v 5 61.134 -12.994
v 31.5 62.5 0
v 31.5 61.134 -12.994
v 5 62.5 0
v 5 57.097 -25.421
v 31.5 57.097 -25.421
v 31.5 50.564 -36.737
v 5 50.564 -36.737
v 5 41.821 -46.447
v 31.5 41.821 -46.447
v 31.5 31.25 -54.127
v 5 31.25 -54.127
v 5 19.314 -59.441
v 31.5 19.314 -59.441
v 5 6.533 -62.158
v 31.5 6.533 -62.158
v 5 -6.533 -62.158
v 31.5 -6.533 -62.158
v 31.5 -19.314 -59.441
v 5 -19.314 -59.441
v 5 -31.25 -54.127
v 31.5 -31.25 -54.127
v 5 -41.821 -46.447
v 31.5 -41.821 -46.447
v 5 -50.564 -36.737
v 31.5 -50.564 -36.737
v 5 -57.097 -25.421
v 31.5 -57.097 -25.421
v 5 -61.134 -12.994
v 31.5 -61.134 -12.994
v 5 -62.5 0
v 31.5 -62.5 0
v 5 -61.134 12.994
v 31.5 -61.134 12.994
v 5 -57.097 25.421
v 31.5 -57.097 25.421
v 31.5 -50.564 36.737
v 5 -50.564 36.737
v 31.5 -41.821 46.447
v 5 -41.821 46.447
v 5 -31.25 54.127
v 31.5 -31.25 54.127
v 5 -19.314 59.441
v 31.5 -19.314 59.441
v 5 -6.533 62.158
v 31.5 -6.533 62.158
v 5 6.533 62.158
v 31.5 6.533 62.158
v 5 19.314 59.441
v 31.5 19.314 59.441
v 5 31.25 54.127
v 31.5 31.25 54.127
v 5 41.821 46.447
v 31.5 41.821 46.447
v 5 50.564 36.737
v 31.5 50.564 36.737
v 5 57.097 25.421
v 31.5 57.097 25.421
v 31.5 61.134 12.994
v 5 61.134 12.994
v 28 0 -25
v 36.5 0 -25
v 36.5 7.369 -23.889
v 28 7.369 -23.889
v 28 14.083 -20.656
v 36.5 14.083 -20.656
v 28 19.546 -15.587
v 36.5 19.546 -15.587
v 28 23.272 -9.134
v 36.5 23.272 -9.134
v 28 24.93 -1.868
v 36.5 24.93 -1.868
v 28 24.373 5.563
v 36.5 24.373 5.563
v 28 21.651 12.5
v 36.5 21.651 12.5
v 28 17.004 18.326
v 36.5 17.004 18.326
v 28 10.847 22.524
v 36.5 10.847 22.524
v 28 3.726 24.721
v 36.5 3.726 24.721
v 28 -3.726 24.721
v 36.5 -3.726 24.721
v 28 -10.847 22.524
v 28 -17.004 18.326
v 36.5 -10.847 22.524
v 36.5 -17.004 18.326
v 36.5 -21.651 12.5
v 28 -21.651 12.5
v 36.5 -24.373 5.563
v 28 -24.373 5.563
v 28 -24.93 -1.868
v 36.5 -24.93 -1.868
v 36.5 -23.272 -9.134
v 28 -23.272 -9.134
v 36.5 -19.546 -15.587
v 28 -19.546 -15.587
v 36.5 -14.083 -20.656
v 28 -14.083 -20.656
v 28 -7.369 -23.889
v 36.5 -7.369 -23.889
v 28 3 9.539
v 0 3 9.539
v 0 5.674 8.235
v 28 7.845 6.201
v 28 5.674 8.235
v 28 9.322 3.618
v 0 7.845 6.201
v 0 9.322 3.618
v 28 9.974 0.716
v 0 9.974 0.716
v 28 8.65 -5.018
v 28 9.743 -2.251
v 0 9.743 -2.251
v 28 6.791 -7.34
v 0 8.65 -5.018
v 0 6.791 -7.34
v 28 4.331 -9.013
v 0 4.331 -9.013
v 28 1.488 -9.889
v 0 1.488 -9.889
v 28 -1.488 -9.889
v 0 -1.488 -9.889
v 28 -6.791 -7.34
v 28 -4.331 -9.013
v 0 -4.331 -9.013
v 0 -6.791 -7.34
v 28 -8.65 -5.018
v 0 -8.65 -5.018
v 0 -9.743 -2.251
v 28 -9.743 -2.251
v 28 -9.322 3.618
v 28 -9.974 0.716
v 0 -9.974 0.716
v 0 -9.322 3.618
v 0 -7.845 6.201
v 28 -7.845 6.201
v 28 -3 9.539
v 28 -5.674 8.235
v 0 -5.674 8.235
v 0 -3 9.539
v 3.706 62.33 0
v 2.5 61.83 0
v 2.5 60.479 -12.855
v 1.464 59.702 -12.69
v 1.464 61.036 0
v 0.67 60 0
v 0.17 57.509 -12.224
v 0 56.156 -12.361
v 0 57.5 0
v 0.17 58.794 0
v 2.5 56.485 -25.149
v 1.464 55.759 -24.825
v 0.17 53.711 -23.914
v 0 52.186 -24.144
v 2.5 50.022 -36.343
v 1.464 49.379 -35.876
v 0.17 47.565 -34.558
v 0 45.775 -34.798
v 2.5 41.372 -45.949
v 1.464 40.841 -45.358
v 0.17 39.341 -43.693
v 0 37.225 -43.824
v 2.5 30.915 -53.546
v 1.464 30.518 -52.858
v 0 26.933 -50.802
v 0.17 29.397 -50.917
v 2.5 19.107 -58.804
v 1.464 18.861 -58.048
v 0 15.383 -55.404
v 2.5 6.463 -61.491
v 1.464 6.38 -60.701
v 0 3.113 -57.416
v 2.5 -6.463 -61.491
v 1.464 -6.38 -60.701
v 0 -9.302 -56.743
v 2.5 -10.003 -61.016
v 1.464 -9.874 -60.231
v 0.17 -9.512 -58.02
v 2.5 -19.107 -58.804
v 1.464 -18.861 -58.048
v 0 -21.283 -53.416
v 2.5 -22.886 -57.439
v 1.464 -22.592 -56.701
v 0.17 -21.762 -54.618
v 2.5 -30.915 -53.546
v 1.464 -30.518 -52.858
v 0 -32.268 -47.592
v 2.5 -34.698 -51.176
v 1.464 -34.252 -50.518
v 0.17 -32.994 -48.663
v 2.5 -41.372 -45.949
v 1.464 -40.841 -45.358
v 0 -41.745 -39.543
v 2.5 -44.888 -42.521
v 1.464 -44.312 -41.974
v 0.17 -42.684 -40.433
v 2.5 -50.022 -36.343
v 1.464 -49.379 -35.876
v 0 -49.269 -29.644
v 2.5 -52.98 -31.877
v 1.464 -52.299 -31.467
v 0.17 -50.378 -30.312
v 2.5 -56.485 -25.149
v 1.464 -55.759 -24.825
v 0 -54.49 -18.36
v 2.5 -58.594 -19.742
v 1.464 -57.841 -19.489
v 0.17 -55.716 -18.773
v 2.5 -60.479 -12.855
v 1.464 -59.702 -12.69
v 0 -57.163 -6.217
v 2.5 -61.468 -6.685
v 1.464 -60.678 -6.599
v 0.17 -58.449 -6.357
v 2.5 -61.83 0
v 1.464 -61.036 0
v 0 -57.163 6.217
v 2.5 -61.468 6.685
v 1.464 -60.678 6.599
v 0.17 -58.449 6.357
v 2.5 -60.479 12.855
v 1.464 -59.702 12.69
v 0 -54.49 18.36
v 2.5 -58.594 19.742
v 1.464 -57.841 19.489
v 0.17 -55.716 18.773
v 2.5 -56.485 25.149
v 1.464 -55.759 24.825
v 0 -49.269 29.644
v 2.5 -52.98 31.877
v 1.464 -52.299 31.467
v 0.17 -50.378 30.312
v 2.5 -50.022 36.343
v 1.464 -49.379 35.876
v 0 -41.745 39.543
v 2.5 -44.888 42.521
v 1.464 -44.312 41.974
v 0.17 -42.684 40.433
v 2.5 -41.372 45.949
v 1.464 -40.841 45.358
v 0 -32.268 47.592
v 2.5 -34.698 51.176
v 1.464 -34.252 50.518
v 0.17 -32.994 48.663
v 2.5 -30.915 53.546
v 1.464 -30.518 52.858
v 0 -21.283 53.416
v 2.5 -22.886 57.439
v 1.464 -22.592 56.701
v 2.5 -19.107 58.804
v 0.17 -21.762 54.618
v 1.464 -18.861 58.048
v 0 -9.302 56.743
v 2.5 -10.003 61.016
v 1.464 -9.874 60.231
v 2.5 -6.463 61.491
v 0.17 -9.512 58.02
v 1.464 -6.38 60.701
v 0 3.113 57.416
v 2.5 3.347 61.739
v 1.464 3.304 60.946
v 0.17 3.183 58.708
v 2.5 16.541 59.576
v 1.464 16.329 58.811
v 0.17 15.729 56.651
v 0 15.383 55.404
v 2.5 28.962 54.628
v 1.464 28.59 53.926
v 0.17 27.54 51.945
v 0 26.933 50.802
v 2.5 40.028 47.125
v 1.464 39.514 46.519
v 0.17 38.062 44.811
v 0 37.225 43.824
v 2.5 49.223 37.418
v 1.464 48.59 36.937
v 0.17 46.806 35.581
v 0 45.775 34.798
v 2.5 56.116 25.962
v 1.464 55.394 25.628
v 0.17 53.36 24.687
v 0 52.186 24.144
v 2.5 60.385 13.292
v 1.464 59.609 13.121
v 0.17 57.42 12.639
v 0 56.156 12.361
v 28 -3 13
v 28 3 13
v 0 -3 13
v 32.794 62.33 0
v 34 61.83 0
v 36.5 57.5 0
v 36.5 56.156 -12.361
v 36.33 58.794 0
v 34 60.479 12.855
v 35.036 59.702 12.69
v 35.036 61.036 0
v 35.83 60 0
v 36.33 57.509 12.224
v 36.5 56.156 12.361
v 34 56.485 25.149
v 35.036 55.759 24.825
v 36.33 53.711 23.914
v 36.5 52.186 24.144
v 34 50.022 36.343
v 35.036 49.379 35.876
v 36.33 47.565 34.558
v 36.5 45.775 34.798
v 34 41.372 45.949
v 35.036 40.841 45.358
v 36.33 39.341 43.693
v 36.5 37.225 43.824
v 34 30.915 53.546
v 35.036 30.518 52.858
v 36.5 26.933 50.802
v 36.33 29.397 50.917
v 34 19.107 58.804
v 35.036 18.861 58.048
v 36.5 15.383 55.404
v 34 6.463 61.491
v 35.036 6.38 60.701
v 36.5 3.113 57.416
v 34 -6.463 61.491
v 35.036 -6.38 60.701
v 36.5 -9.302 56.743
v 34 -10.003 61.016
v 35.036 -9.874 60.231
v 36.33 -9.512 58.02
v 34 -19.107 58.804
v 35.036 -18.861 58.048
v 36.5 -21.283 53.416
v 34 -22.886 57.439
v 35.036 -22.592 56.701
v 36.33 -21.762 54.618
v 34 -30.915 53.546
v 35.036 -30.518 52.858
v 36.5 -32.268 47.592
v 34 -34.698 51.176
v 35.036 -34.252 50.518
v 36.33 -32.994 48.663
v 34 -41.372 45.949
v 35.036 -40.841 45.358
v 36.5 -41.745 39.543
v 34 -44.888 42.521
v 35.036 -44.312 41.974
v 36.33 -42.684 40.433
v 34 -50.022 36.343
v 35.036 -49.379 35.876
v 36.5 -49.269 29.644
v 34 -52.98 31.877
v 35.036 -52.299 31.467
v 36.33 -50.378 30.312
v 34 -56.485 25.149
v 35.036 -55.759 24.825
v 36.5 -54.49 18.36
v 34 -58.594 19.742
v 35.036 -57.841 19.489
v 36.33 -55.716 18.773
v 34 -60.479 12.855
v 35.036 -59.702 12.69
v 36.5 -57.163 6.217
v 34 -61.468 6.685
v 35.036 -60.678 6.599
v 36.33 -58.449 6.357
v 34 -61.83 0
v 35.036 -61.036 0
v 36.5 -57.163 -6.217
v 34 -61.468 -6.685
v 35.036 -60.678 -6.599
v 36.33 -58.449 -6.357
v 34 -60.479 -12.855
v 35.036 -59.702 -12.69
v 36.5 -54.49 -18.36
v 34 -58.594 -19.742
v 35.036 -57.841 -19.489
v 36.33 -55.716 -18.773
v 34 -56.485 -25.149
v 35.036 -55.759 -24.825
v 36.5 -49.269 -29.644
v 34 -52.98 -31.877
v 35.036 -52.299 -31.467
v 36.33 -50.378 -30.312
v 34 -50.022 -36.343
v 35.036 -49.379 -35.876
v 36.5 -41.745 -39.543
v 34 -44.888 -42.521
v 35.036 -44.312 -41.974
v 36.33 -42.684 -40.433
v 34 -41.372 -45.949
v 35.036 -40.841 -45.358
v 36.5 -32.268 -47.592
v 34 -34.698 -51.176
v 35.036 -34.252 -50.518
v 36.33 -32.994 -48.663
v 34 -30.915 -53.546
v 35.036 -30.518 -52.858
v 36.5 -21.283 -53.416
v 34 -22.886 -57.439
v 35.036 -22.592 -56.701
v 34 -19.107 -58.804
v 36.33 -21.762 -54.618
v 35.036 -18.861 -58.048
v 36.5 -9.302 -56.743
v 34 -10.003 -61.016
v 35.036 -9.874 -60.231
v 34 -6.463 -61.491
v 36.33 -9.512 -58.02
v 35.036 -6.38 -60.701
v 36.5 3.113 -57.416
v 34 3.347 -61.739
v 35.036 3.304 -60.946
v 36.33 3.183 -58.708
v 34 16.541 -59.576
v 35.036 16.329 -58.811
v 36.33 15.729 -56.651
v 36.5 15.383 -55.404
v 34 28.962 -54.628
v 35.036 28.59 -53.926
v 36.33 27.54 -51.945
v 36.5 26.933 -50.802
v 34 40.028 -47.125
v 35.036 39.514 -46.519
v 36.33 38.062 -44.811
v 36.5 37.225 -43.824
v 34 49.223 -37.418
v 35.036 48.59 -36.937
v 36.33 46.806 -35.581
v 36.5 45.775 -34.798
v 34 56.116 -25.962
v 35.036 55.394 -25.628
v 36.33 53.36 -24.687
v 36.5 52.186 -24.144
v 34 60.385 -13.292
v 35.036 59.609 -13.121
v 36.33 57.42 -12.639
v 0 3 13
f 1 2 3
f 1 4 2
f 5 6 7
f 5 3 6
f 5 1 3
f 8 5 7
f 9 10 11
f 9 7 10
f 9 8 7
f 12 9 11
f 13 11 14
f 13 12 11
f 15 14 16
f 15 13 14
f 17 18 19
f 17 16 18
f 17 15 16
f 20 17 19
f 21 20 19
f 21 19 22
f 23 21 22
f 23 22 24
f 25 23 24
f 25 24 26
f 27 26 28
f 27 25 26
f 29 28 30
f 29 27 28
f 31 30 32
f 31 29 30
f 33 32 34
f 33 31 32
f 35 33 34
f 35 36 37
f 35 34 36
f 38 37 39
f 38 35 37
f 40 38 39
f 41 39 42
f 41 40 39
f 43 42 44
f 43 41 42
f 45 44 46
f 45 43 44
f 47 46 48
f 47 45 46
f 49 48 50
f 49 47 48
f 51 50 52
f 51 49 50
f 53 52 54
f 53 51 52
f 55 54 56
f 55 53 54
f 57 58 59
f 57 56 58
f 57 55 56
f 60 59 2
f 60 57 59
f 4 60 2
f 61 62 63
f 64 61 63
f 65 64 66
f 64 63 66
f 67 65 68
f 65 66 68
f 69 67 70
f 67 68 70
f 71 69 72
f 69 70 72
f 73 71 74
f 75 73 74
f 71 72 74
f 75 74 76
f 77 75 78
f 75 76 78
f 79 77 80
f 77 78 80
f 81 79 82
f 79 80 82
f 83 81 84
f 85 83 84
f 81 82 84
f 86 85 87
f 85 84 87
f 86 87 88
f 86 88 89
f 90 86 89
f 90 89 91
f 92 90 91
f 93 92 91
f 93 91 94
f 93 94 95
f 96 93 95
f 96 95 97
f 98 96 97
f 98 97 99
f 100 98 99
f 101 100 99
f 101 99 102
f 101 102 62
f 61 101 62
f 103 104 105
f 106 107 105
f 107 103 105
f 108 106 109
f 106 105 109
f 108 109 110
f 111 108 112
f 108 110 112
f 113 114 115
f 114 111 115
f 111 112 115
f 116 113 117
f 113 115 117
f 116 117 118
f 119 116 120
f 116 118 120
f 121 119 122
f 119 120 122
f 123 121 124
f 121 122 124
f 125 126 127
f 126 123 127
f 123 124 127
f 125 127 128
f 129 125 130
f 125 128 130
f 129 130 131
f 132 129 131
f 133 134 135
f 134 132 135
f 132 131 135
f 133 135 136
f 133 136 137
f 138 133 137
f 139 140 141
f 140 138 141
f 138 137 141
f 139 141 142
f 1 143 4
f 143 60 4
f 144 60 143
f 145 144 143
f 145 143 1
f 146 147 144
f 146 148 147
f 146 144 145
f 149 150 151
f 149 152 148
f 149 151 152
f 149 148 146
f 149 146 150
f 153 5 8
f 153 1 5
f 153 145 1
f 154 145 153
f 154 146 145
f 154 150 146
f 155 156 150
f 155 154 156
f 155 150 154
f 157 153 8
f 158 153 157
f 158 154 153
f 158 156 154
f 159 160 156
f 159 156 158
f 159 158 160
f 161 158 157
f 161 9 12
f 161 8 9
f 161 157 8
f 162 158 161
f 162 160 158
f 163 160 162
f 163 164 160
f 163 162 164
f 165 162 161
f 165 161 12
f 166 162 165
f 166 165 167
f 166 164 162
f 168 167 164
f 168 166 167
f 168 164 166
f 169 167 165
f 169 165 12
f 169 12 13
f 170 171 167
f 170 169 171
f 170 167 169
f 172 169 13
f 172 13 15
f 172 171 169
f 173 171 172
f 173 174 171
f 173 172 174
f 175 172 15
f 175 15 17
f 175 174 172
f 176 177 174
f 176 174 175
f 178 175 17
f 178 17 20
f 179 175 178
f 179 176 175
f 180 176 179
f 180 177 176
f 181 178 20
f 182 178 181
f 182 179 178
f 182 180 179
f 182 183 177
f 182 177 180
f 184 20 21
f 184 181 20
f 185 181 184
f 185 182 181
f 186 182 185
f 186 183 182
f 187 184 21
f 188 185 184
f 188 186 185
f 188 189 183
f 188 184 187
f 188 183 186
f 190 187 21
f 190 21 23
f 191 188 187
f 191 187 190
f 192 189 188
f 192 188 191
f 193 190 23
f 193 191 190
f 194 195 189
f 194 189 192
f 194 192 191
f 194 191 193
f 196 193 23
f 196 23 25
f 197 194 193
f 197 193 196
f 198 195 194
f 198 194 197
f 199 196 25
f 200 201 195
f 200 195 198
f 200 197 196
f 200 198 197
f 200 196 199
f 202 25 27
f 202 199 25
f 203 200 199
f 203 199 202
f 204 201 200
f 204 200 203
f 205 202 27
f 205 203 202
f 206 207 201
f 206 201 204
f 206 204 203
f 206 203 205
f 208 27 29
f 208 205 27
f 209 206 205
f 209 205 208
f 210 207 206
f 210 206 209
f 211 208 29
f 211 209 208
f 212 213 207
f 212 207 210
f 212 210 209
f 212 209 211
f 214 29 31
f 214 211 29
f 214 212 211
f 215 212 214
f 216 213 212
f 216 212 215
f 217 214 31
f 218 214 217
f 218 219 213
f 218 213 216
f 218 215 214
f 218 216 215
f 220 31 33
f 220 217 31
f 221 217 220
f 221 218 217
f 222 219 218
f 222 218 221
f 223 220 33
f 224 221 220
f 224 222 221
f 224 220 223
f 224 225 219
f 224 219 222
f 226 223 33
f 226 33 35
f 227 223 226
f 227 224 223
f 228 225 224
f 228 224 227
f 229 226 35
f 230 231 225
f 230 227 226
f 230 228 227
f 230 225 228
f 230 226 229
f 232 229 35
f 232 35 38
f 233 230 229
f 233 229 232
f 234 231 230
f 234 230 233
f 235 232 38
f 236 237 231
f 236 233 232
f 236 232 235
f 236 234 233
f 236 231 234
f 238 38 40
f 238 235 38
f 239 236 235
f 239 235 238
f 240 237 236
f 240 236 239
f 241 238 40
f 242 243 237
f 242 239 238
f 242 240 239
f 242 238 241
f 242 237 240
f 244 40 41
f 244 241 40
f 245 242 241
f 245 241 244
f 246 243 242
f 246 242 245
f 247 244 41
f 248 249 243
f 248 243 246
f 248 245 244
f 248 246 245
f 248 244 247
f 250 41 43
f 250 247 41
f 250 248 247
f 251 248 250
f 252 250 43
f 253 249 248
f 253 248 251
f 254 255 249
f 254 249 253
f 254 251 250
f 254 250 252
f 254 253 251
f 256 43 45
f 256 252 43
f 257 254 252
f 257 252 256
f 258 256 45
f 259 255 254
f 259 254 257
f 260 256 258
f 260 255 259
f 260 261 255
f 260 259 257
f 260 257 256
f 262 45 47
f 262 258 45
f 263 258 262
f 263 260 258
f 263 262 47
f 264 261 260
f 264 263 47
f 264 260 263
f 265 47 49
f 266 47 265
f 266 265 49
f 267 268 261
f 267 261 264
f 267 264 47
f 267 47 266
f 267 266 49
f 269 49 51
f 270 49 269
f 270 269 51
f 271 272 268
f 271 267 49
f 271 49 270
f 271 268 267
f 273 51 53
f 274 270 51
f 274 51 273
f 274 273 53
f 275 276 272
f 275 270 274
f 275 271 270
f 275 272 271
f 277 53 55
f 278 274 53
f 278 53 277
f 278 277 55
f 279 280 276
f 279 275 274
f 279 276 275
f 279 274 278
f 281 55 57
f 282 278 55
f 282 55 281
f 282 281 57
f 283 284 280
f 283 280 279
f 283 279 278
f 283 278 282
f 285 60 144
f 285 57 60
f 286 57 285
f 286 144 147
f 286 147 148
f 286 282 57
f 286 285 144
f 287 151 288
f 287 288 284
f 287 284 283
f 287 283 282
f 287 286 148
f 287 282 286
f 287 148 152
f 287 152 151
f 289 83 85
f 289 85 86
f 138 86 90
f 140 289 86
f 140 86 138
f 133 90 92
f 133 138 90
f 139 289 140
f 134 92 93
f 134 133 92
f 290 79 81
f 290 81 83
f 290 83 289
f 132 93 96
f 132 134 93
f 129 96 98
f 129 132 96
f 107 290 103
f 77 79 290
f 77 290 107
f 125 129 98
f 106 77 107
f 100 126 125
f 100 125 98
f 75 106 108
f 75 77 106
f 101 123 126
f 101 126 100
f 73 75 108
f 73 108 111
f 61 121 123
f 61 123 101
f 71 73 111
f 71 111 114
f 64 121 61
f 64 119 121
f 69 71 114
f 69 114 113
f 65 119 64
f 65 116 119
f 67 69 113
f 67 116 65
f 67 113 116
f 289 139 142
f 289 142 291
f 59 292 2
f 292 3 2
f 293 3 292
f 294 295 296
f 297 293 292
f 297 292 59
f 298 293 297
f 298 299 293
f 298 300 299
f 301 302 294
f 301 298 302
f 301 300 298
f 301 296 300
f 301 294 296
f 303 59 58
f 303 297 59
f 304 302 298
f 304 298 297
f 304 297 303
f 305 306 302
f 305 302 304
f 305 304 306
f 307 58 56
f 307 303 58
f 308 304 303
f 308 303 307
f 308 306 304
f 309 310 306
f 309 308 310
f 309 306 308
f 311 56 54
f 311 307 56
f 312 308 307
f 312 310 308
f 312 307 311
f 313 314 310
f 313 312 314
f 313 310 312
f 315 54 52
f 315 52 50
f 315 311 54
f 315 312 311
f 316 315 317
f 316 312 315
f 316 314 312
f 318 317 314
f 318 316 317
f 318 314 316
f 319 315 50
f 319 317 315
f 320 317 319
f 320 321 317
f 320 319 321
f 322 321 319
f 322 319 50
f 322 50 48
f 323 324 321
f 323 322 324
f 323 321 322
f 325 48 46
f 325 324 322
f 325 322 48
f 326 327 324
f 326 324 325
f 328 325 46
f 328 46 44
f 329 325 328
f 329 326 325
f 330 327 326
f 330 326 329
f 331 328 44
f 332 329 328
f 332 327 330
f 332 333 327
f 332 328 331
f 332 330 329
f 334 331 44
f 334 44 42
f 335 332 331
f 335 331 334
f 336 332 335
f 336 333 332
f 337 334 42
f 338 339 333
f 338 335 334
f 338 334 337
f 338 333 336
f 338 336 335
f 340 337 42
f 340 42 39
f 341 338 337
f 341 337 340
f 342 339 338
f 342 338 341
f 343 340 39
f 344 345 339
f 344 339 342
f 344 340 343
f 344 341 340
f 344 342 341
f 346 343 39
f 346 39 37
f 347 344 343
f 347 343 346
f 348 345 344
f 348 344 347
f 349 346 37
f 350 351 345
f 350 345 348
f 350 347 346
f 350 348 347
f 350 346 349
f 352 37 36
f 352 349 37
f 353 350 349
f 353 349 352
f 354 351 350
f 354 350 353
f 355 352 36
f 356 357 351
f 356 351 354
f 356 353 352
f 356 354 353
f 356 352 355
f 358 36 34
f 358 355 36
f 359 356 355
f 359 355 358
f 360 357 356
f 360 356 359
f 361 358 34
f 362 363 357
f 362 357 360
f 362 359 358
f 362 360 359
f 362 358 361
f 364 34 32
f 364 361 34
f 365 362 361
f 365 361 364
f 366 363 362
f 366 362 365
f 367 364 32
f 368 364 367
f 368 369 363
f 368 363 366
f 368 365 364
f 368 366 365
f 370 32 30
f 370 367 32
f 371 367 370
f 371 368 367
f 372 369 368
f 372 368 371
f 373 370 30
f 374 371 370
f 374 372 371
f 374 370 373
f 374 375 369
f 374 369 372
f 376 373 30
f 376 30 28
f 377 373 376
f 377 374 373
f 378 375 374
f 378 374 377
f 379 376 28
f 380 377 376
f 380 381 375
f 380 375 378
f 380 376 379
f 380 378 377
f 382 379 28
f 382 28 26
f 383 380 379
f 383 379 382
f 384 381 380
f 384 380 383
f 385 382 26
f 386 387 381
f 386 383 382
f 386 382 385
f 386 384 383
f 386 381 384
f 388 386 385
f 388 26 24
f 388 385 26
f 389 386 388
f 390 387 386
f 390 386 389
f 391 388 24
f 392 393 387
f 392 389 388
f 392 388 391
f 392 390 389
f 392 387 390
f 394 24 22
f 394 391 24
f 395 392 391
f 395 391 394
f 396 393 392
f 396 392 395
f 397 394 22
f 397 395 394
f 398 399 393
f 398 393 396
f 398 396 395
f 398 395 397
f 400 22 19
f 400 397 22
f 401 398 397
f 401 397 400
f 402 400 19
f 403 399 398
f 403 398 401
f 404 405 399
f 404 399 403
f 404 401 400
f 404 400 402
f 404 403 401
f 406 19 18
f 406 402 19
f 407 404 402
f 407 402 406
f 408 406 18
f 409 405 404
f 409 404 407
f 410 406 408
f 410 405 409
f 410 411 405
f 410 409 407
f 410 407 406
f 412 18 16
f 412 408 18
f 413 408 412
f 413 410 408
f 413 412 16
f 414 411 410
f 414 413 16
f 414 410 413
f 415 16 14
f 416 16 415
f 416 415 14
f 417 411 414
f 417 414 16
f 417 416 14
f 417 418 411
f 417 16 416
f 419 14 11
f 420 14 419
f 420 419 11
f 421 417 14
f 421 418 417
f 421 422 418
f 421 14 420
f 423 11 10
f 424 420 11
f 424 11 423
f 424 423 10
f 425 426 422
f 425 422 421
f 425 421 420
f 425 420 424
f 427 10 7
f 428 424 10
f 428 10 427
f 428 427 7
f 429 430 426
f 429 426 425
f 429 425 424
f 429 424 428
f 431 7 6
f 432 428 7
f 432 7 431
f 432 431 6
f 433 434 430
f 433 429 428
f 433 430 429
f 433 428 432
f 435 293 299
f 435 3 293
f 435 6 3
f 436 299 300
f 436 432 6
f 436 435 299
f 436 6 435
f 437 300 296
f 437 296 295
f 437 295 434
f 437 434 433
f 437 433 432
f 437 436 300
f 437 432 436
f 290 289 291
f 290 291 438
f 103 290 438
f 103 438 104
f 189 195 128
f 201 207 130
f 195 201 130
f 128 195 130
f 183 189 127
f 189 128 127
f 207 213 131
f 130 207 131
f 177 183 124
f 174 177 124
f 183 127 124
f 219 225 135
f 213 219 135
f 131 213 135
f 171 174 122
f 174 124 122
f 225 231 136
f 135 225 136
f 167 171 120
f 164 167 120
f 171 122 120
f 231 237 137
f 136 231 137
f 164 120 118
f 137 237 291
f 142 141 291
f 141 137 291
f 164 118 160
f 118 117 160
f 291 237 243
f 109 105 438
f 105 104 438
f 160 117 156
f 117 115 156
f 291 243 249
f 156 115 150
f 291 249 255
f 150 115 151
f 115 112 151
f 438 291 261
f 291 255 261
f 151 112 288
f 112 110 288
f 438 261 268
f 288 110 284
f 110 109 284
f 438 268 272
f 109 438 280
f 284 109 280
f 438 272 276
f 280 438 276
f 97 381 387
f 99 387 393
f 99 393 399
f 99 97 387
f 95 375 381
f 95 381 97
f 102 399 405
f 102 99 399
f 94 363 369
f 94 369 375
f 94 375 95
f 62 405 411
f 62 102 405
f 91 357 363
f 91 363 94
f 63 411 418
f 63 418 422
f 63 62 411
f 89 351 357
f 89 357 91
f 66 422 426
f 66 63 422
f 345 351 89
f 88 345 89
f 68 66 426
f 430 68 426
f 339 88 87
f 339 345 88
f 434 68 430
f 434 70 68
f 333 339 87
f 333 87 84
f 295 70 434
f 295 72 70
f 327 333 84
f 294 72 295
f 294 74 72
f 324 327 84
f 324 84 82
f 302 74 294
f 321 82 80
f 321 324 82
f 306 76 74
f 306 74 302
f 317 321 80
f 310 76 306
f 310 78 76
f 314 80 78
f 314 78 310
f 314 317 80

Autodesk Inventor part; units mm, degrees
ref_plane "YZ Plane" through (0, 0, 0) normal (1, 0, 0) x (0, 1, 0)
ref_plane "XZ Plane" through (0, 0, 0) normal (0, 1, 0) x (-1, 0, 0)
ref_plane "XY Plane" through (0, 0, 0) normal (0, 0, 1) x (1, 0, 0)
sketch "Sketch1" plane through (0, 0, 0) normal (1, 0, 0) x (0, 1, 0)
  circle A0 centre (0, 0) radius 62.5
  dimension "d0" = 125
extrude "Extrusion1" add sketch "Sketch1" along normal blind 36.5
fillet "Fillet1" radius 5 2 edges at (36.5, -62.5, 0) (0, -62.5, 0)
sketch "Sketch2" plane through (36.5, 0, 0) normal (1, 0, 0) x (0, 0, -1)
  circle A0 centre (0, 0) radius 62.5 projected
hole "Hole1" at (36.5, 0, 0) direction (-1, 0, 0) diameter 20 end through all
sketch "Sketch3" plane through (36.5, 0, 0) normal (1, 0, 0) x (0, 0, -1)
  circle A0 centre (0, 0) radius 25
  dimension "d11" = 50
extrude "Extrusion2" cut sketch "Sketch3" against normal blind 8.5
sketch "Sketch4" plane through (28, 0, 0) normal (1, 0, 0) x (0, 0, -1)
  line L0 (-7, -3) -> (-13, -3)
  line L1 (-13, -3) -> (-13, 3)
  line L2 (-13, 3) -> (-7, 3)
  line L3 (-7, 3) -> (-7, -3)
  circle A0 centre (0, 0) radius 10 projected
  line L4 (-7, -3) -> (-13, 3) construction
  line L5 (-13, -3) -> (-7, 3) construction
  point P0 (-10, 0)
  dimension "d14" = 6
  dimension "d15" = 6
extrude "Extrusion3" cut sketch "Sketch4" against normal blind 28 contours L0 A0 L2 L3 | L0 L1 L2 A0 picked at (-7.9828, 0.338)
properties part number "100mm Traction Wheel StandIn" material "Rubber"
